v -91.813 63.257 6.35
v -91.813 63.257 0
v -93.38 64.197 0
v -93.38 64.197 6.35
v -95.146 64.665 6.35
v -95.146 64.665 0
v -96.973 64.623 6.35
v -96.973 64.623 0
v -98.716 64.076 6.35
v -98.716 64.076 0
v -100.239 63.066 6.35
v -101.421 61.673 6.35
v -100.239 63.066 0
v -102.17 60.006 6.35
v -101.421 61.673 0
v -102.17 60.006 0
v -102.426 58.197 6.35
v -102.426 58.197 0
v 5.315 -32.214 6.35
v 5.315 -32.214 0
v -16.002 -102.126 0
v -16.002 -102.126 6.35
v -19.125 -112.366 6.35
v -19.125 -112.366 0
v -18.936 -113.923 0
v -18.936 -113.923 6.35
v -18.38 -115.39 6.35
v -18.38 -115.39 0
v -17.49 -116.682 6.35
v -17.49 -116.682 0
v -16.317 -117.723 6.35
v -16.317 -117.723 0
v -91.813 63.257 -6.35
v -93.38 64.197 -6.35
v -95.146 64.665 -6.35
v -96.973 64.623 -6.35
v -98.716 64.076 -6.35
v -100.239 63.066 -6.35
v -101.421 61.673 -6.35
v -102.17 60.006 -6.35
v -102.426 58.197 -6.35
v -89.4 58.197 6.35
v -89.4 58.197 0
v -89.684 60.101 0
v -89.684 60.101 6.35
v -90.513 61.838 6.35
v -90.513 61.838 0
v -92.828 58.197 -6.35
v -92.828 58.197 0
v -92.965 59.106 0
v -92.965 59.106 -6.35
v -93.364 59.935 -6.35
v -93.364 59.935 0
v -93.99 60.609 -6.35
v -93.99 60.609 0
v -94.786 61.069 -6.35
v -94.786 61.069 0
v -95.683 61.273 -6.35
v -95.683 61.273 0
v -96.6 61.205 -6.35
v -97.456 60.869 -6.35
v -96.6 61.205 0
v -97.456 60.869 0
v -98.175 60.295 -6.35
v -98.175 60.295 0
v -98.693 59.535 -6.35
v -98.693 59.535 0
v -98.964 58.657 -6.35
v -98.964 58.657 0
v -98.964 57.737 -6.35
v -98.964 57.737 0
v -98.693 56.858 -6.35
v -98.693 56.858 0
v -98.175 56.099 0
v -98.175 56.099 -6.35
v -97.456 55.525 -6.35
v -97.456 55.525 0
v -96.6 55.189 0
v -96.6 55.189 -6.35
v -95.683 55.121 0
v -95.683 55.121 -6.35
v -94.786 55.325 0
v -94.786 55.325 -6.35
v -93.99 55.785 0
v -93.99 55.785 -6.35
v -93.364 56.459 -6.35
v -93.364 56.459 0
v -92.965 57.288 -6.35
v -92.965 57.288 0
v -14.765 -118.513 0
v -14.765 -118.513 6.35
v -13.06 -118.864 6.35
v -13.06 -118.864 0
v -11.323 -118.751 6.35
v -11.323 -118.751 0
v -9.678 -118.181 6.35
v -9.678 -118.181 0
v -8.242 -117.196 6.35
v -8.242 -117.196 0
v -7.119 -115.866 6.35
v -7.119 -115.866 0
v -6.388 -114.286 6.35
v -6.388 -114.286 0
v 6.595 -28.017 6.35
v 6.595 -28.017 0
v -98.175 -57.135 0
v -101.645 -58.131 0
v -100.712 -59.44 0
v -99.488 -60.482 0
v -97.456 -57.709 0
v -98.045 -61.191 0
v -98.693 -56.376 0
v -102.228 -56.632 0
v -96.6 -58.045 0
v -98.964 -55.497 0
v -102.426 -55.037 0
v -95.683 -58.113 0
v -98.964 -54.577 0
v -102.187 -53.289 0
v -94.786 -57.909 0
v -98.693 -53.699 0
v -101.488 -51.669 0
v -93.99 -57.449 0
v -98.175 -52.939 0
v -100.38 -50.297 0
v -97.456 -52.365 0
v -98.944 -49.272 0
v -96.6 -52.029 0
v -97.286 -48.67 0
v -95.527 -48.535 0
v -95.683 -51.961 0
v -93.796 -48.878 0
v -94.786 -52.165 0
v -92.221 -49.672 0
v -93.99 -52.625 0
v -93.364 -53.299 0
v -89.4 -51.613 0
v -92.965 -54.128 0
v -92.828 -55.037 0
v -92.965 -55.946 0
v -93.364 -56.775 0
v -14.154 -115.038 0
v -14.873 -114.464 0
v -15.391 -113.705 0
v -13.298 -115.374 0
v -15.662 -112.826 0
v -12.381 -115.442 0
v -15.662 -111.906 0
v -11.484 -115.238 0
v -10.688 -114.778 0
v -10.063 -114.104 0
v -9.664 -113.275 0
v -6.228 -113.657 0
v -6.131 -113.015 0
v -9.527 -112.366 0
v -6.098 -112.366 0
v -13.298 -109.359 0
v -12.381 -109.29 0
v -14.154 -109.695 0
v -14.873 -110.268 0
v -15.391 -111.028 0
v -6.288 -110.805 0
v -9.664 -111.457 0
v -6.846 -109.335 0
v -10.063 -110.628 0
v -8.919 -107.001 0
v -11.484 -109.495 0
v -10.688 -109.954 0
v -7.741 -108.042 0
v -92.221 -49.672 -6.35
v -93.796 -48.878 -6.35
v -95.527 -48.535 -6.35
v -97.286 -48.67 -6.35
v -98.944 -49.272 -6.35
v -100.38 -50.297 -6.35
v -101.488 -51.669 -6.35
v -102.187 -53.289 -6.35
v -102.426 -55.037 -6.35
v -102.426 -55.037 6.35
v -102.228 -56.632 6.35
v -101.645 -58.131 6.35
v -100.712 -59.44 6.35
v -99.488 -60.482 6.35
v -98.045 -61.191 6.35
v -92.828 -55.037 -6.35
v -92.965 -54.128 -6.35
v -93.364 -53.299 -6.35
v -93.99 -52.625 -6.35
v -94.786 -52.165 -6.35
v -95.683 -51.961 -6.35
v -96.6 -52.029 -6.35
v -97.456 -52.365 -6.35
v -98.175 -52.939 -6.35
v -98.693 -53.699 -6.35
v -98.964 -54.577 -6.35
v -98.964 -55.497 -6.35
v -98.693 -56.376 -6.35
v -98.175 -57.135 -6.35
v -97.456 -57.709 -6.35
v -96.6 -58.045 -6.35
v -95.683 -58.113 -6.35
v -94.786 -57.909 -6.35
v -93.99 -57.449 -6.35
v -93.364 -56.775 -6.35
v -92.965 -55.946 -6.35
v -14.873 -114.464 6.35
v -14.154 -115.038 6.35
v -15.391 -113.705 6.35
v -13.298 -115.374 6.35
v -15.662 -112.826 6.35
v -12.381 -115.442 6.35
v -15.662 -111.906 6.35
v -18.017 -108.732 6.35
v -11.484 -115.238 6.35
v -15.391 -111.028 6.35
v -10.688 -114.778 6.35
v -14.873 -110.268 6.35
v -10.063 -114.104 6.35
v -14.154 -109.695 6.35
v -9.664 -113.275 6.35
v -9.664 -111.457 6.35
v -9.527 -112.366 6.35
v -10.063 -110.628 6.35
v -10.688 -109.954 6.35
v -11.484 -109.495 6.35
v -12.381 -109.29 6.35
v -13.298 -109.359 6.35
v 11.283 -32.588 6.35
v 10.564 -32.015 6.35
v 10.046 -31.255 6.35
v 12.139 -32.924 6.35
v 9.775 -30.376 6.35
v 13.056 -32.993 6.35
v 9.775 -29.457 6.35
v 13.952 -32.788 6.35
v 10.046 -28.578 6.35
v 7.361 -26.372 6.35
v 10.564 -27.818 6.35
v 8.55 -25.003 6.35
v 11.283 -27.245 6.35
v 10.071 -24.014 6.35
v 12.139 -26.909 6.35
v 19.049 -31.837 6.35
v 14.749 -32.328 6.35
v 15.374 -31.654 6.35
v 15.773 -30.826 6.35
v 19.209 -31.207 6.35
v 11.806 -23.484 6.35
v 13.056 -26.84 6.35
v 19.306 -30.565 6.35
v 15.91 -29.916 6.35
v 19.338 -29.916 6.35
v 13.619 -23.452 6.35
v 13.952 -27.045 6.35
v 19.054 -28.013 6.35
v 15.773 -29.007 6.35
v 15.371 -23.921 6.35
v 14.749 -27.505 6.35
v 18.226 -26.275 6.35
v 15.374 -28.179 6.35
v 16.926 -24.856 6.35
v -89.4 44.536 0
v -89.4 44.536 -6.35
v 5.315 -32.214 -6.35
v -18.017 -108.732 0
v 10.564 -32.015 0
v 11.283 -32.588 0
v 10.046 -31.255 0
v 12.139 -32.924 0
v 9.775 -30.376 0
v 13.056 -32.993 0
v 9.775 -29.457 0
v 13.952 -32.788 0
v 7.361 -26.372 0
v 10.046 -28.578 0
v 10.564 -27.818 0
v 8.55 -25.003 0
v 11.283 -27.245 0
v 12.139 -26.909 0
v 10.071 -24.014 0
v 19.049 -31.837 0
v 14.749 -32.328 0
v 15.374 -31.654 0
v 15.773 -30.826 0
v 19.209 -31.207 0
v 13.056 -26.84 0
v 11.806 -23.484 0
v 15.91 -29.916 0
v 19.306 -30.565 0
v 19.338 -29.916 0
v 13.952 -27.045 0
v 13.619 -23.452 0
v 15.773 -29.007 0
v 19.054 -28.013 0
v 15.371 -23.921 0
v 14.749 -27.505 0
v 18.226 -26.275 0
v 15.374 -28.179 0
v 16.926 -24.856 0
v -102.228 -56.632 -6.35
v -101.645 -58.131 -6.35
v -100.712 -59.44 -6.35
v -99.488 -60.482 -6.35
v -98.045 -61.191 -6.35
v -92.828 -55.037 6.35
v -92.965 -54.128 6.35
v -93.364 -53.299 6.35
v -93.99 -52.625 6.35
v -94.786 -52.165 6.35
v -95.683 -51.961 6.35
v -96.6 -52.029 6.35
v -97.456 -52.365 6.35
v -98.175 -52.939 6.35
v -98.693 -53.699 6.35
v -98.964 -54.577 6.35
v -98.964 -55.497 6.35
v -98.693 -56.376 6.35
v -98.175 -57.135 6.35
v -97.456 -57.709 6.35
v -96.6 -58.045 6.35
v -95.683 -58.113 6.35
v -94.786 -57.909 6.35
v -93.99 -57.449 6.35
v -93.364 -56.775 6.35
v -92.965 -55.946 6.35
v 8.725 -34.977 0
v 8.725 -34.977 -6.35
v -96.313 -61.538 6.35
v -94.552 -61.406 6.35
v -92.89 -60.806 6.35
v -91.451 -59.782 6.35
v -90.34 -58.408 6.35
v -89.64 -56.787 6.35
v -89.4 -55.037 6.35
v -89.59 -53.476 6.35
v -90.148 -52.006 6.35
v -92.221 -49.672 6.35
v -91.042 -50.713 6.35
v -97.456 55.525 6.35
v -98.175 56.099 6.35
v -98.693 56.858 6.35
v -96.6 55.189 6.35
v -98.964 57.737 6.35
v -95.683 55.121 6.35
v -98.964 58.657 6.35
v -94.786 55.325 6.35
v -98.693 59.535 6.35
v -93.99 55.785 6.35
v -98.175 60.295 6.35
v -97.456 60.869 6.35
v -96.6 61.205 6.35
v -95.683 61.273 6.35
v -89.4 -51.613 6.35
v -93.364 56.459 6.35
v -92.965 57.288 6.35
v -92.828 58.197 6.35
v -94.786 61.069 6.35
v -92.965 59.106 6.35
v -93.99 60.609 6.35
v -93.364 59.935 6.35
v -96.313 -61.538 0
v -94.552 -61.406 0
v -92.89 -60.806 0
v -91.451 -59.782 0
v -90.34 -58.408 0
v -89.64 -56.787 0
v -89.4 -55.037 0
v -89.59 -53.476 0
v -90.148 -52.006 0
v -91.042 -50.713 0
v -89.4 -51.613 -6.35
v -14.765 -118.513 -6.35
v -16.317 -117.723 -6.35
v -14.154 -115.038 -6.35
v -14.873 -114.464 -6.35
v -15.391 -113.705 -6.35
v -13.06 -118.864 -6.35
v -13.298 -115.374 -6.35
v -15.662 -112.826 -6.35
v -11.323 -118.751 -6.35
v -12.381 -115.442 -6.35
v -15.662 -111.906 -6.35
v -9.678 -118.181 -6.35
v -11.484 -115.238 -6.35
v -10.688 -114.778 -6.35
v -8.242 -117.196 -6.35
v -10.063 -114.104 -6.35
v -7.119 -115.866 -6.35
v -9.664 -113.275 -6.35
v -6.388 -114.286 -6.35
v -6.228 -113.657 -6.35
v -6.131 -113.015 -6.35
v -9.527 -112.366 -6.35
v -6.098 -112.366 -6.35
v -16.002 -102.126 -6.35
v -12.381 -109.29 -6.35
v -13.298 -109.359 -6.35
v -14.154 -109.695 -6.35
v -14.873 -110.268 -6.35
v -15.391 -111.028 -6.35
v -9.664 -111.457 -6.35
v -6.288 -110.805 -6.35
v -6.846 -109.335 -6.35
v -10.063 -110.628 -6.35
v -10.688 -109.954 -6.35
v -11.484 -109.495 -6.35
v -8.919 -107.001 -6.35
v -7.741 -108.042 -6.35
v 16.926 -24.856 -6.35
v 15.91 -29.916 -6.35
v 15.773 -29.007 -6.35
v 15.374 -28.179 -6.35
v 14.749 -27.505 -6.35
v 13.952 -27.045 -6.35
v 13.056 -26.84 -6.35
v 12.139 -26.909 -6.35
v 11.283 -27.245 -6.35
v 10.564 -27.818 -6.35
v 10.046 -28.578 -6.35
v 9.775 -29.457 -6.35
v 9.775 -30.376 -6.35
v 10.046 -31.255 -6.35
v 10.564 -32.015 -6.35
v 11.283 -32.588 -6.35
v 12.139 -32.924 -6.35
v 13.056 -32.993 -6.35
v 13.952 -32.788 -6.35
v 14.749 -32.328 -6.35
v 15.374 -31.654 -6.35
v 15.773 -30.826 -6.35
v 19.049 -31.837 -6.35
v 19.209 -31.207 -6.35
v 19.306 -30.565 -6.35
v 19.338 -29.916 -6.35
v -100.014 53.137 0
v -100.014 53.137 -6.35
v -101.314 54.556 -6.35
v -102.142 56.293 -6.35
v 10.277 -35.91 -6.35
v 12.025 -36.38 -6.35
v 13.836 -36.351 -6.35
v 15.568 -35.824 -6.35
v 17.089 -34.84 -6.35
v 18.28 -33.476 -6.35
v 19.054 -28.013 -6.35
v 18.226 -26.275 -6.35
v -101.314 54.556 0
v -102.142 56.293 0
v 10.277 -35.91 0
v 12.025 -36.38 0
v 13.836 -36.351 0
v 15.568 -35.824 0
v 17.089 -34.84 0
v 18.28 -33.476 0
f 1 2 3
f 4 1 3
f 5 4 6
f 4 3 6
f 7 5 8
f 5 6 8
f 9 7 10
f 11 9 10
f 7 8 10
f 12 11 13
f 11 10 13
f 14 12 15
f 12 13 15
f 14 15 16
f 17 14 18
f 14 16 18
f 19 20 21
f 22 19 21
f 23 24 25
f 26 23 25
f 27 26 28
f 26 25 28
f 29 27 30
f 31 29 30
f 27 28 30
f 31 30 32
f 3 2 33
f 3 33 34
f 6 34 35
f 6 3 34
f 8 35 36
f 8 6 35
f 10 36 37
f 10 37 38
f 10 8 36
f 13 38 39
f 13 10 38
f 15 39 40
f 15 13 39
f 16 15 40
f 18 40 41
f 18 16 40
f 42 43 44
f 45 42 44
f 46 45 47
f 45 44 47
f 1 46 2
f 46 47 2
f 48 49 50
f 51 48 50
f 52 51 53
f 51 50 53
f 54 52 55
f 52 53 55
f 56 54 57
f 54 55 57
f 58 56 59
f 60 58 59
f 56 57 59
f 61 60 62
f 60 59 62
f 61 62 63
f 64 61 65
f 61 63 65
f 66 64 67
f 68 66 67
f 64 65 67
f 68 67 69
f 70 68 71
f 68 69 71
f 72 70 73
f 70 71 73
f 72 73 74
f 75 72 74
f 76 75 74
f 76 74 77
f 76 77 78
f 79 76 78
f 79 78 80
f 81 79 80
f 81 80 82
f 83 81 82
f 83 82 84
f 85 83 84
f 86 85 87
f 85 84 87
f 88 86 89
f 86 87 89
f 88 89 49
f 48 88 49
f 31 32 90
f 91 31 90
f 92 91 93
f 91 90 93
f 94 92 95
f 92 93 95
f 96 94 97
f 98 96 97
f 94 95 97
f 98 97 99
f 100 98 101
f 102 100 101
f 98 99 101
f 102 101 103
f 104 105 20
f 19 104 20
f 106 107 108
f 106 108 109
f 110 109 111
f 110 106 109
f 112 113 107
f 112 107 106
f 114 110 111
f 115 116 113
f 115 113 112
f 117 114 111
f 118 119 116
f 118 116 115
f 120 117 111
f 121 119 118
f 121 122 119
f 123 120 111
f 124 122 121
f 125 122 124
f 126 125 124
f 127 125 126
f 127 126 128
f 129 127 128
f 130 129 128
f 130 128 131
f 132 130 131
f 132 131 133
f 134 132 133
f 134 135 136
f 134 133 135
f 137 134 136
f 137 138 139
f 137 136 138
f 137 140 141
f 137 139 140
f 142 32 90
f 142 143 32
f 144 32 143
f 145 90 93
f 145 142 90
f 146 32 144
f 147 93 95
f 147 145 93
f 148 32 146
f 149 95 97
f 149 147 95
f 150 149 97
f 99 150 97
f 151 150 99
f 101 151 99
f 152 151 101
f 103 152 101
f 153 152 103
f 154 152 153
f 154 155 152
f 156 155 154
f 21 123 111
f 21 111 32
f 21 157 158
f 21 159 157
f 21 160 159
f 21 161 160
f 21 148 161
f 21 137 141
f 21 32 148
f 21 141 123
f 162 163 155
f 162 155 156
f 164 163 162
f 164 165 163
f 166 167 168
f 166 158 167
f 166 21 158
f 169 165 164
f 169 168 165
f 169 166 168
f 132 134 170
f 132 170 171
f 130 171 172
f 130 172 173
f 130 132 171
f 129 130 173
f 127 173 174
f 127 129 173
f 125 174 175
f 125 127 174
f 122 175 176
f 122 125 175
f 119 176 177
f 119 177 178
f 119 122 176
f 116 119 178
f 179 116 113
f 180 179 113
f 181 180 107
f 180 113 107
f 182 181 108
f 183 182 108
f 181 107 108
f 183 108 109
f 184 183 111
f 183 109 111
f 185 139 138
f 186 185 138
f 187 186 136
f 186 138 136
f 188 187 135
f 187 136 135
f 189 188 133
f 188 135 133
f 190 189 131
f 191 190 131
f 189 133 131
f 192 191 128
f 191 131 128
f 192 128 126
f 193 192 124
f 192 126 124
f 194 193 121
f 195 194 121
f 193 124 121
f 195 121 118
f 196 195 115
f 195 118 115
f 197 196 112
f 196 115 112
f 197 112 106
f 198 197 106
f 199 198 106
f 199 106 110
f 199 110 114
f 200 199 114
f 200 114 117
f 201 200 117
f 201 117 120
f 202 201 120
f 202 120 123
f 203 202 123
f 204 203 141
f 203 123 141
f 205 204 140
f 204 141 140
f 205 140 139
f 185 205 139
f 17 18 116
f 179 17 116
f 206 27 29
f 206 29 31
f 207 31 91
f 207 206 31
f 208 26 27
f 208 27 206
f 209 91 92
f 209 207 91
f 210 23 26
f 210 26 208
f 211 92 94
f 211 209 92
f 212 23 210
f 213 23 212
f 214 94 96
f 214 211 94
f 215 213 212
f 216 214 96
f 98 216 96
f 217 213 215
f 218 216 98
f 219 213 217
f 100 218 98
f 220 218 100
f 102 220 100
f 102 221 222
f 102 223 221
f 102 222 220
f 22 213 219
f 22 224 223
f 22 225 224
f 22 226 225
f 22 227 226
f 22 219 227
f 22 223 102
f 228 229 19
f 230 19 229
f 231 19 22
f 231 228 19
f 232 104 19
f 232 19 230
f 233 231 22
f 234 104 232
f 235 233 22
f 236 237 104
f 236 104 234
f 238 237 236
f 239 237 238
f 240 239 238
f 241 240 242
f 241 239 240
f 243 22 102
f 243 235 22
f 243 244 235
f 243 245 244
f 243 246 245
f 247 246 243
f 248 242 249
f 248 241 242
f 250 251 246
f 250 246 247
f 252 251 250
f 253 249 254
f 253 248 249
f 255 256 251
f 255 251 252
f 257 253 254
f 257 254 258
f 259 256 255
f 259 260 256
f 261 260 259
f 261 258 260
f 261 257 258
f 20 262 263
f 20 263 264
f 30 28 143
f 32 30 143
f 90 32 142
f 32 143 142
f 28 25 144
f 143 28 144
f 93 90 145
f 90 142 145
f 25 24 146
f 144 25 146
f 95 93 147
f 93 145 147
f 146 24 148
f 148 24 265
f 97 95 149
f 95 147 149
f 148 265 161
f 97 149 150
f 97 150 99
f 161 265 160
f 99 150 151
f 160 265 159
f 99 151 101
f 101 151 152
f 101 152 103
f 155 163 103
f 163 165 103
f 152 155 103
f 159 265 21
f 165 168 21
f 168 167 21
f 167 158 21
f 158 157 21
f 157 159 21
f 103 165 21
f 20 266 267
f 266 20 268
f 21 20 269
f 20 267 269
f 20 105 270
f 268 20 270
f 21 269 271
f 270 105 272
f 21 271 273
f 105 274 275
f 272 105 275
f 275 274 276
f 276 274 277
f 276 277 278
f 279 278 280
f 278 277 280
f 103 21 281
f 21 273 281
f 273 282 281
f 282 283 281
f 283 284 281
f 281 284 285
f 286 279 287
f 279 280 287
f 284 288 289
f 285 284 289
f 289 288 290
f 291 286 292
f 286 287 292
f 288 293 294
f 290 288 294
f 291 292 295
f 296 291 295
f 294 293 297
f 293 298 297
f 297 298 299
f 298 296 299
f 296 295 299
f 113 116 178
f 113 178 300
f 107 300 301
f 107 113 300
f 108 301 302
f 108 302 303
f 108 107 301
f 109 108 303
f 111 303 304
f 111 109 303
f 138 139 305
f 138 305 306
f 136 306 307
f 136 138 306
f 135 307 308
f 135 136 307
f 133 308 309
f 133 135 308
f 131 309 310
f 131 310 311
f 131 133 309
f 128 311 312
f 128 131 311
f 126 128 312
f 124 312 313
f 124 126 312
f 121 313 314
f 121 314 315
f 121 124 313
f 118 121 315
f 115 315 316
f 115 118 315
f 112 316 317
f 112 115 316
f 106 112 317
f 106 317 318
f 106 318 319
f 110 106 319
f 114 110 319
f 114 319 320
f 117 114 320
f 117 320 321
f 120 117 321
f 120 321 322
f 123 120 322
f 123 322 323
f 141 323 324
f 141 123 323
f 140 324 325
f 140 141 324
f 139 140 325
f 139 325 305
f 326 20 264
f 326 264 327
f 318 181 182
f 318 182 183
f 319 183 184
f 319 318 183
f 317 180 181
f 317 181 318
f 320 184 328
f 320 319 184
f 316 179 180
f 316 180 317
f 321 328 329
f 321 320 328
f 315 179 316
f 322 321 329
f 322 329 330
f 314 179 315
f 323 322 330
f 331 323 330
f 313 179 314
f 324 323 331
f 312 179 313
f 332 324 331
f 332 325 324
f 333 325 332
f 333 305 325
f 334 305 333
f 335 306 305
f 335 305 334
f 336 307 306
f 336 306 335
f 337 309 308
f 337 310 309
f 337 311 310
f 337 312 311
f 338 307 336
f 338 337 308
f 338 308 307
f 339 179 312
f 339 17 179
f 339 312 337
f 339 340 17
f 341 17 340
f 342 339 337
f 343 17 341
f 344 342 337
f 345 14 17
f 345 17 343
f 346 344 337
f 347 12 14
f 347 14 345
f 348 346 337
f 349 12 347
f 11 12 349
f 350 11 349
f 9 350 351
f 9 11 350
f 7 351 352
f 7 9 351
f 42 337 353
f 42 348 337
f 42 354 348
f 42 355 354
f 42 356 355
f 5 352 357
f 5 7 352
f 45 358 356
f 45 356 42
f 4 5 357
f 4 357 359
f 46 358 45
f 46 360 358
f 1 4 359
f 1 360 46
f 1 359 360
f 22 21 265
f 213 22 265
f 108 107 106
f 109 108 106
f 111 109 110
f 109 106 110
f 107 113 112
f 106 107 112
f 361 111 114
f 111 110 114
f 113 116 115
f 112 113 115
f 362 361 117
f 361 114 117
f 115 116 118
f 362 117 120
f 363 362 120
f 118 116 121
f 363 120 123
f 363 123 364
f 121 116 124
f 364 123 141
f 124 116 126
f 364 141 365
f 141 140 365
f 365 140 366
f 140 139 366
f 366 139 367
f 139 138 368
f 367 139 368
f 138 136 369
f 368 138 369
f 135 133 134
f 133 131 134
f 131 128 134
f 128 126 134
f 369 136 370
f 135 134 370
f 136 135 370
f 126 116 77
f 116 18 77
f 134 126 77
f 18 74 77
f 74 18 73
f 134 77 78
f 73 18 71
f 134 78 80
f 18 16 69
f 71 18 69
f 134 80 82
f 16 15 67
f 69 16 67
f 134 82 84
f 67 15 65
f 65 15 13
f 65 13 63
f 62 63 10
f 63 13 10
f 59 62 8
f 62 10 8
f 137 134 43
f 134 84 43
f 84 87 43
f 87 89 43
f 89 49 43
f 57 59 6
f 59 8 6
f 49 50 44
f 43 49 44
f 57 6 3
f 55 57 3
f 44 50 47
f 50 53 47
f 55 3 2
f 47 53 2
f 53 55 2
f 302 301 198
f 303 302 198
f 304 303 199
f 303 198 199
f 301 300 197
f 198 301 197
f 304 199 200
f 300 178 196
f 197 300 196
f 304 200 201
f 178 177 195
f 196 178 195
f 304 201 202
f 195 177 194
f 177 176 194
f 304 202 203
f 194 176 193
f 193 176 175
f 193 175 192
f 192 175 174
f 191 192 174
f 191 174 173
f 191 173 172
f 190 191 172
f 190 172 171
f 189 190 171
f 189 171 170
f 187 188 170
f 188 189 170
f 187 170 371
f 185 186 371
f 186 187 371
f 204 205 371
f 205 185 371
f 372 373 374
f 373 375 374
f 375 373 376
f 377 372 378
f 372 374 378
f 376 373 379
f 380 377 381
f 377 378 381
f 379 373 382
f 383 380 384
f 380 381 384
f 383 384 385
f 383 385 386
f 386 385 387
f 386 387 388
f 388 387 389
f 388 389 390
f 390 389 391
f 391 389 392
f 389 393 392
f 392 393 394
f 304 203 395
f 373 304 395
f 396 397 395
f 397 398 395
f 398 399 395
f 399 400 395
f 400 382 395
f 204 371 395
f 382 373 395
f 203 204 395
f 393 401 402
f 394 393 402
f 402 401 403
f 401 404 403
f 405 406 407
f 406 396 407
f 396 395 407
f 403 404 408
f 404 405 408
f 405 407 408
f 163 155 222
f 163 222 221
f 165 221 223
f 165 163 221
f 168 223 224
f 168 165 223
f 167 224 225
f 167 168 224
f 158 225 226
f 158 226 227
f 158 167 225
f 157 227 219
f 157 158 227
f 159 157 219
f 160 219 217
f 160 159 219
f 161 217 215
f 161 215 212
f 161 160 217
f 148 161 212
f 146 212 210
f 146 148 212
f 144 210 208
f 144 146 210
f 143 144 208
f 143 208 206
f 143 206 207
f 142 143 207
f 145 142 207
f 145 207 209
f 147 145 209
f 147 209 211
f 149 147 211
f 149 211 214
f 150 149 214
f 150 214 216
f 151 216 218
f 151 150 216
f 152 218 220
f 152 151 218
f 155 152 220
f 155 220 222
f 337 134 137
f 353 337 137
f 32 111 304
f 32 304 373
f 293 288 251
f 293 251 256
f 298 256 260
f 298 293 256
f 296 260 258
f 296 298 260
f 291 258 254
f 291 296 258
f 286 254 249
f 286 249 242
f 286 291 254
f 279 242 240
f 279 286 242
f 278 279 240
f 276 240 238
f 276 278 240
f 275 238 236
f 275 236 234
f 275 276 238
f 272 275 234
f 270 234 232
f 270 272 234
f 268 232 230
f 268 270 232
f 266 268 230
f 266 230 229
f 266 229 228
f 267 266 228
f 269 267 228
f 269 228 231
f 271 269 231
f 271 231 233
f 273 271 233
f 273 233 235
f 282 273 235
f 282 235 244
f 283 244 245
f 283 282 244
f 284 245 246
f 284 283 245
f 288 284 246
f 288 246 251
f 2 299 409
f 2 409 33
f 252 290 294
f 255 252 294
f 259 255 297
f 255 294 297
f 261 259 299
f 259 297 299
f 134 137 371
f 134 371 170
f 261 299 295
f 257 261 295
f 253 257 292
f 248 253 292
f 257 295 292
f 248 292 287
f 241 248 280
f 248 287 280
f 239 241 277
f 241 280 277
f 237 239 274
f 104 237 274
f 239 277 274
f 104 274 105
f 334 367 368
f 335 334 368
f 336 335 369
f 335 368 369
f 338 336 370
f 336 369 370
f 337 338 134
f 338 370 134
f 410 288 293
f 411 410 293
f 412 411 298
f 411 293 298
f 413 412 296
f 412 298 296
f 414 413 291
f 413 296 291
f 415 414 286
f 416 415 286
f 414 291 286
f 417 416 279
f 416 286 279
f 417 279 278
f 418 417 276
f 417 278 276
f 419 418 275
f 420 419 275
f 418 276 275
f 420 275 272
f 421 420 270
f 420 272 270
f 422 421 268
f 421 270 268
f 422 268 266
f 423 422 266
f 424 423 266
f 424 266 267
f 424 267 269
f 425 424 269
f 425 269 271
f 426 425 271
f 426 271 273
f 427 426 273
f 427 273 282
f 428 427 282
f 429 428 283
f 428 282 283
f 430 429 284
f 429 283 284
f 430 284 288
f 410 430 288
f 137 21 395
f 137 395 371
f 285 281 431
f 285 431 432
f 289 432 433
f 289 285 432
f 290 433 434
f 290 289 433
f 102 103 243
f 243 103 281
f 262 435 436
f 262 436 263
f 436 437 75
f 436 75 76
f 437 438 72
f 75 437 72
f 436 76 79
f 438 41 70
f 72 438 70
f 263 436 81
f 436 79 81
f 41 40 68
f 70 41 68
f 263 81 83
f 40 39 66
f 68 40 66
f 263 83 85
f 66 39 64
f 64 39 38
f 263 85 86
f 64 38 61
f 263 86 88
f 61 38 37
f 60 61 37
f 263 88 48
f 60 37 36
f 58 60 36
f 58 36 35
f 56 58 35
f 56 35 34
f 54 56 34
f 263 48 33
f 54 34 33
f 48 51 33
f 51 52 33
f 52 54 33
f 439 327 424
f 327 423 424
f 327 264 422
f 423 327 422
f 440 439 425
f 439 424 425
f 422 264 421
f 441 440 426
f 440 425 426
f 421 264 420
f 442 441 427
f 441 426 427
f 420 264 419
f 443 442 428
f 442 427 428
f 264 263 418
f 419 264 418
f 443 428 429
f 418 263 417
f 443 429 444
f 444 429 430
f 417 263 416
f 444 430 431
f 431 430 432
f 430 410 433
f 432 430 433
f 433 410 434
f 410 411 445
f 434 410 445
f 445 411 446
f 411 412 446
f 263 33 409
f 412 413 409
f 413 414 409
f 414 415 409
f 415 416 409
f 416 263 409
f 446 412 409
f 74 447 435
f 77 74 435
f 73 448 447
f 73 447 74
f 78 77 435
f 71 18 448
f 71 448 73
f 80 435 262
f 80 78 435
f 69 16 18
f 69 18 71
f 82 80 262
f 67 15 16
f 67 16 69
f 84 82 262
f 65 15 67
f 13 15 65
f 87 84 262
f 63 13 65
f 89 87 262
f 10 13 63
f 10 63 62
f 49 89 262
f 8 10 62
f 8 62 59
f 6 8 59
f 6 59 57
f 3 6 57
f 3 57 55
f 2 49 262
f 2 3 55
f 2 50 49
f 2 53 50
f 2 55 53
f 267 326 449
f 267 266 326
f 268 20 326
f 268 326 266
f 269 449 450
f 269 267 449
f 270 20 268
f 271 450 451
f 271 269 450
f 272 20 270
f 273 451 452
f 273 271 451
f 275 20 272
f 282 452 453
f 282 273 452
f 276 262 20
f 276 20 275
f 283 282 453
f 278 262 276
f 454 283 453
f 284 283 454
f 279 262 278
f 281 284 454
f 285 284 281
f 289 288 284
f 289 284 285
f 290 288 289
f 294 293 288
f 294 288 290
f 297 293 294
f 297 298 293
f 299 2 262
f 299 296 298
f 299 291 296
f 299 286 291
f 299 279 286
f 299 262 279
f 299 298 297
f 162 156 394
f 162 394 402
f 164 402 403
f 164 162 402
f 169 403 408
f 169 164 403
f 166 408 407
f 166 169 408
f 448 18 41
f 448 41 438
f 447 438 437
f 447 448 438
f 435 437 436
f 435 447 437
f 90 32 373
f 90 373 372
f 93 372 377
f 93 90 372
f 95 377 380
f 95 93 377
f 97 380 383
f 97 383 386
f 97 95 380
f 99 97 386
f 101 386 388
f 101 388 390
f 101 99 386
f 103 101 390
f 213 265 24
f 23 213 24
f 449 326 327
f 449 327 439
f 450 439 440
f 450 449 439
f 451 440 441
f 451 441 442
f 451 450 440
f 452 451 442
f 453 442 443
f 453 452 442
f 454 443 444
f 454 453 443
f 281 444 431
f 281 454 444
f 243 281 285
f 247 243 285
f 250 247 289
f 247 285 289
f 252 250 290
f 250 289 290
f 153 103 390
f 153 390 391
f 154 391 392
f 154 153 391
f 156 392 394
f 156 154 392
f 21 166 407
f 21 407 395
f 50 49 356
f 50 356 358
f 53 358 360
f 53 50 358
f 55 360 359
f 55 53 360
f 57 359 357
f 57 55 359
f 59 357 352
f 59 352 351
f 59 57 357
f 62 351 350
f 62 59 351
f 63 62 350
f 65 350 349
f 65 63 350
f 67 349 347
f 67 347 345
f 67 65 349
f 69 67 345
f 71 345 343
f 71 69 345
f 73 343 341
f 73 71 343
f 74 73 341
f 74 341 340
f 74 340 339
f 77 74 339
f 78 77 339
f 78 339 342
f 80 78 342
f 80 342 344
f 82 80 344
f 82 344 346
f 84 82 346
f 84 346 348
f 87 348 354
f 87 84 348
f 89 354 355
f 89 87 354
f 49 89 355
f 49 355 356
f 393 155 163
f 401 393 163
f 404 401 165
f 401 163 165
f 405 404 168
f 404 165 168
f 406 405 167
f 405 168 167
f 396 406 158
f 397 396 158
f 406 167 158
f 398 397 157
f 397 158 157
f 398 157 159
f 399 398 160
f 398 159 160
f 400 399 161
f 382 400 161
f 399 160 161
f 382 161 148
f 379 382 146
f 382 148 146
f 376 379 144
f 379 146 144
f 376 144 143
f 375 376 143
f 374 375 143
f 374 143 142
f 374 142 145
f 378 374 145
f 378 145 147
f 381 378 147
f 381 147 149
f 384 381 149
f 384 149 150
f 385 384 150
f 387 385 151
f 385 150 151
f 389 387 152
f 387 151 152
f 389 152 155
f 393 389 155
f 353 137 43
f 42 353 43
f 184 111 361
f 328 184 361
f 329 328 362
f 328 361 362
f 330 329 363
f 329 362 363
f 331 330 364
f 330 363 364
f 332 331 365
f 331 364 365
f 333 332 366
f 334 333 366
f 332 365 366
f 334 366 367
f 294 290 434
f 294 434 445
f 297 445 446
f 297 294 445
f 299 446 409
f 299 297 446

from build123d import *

# Parameters (mm, degrees)
F0_R     = 3.0849178634
F1_DEPTH = 6.35
F2_DEPTH = 6.35


with BuildPart() as f1:
    # F0 (on Top) → F1 (new body)
    with BuildSketch(Plane.XY):
        with BuildLine():
            ThreePointArc((-16.316703141, -117.7228137789), (-10.4812295121, -118.5211458672), (-6.387803424, -114.286296465))
            ThreePointArc((-6.387803424, -114.286296465), (-6.171117008, -113.3370927796), (-6.0983461646, -112.3661936893))
            ThreePointArc((-6.0983461646, -112.3661936893), (-6.8464855812, -109.3353793535), (-8.919033335, -107.0008357294))
            ThreePointArc((-8.919033335, -107.0008357294), (-13.8291124641, -105.9678228216), (-18.0165959077, -108.7320542033))
            Line((-18.0165959077, -108.7320542033), (-19.1247258839, -112.3661936893))
            ThreePointArc((-19.1247258839, -112.3661936893), (-18.3801623356, -115.3901964385), (-16.316703141, -117.7228137789))
        make_face()
        with Locations((-12.6115360242, -112.3661936893)):
            Circle(F0_R, mode=Mode.SUBTRACT)
        with BuildLine():
            Line((-8.919033335, -107.0008357294), (-16.0022815285, -102.1260607007))
            Line((-16.0022815285, -102.1260607007), (-18.0165959077, -108.7320542033))
            ThreePointArc((-18.0165959077, -108.7320542033), (-13.8291124641, -105.9678228216), (-8.919033335, -107.0008357294))
        make_face()
        with BuildLine():
            Line((-6.387803424, -114.286296465), (19.0490183589, -31.8365552445))
            ThreePointArc((19.0490183589, -31.8365552445), (14.7206225754, -36.1477717913), (8.7247524678, -34.9768149931))
            Line((8.7247524678, -34.9768149931), (5.3154160158, -32.2141477822))
            Line((5.3154160158, -32.2141477822), (-16.0022815285, -102.1260607007))
            Line((-16.0022815285, -102.1260607007), (-8.919033335, -107.0008357294))
            ThreePointArc((-8.919033335, -107.0008357294), (-6.8464855812, -109.3353793535), (-6.0983461646, -112.3661936893))
            ThreePointArc((-6.0983461646, -112.3661936893), (-6.171117008, -113.3370927796), (-6.387803424, -114.286296465))
        make_face()
        with BuildLine():
            ThreePointArc((19.0490183589, -31.8365552445), (19.2657047749, -30.8873515591), (19.3384756184, -29.9164524688))
            ThreePointArc((19.3384756184, -29.9164524688), (18.7044521111, -27.1134103447), (16.9258190496, -24.8560899444))
            ThreePointArc((16.9258190496, -24.8560899444), (10.919725754, -23.6882518284), (6.5952848208, -28.0167865871))
            ThreePointArc((6.5952848208, -28.0167865871), (6.5970851184, -31.8220124735), (8.7247524678, -34.9768149931))
            ThreePointArc((8.7247524678, -34.9768149931), (14.7206225754, -36.1477717913), (19.0490183589, -31.8365552445))
        make_face()
        with Locations((12.8252857587, -29.9164524688)):
            Circle(F0_R, mode=Mode.SUBTRACT)
        with BuildLine():
            ThreePointArc((8.7247524678, -34.9768149931), (6.5970851184, -31.8220124735), (6.5952848208, -28.0167865871))
            Line((6.5952848208, -28.0167865871), (5.3154160158, -32.2141477822))
            Line((5.3154160158, -32.2141477822), (8.7247524678, -34.9768149931))
        make_face()
    extrude(amount=F1_DEPTH)


with BuildPart() as f1b:
    # F0 (on Top) → F1, piece 2 (new body)
    with BuildSketch(Plane.XY):
        with BuildLine():
            ThreePointArc((-92.2206801264, -49.6716589821), (-98.9439971514, -49.2719664991), (-102.4263726753, -55.037016942))
            ThreePointArc((-102.4263726753, -55.037016942), (-101.2191601363, -58.814350237), (-98.0450335378, -61.1914344325))
            ThreePointArc((-98.0450335378, -61.1914344325), (-92.1358495207, -60.3429942627), (-89.399992956, -55.037016942))
            ThreePointArc((-89.399992956, -55.037016942), (-90.1481323727, -52.0062026063), (-92.2206801264, -49.6716589821))
        make_face()
        with Locations((-95.9131828157, -55.037016942)):
            Circle(F0_R, mode=Mode.SUBTRACT)
        with BuildLine():
            ThreePointArc((-100.0137161066, 53.1365777234), (-101.792349168, 55.3938981238), (-102.4263726753, 58.1969402478))
            Line((-102.4263726753, 58.1969402478), (-102.4263726753, -55.037016942))
            ThreePointArc((-102.4263726753, -55.037016942), (-98.9439971514, -49.2719664991), (-92.2206801264, -49.6716589821))
            Line((-92.2206801264, -49.6716589821), (-89.399992956, -51.6128891927))
            Line((-89.399992956, -51.6128891927), (-89.399992956, 44.536022939))
            Line((-89.399992956, 44.536022939), (-100.0137161066, 53.1365777234))
        make_face()
        with BuildLine():
            ThreePointArc((-89.399992956, 58.1969402478), (-90.0340164633, 60.9999823718), (-91.8126495247, 63.2573027721))
            ThreePointArc((-91.8126495247, 63.2573027721), (-98.7162249397, 64.0761066001), (-102.4263726753, 58.1969402478))
            ThreePointArc((-102.4263726753, 58.1969402478), (-101.792349168, 55.3938981238), (-100.0137161066, 53.1365777234))
            ThreePointArc((-100.0137161066, 53.1365777234), (-93.1101406917, 52.3177738954), (-89.399992956, 58.1969402478))
        make_face()
        with Locations((-95.9131828157, 58.1969402478)):
            Circle(F0_R, mode=Mode.SUBTRACT)
        with BuildLine():
            Line((-89.399992956, 44.536022939), (-89.399992956, 58.1969402478))
            ThreePointArc((-89.399992956, 58.1969402478), (-93.1101406917, 52.3177738954), (-100.0137161066, 53.1365777234))
            Line((-100.0137161066, 53.1365777234), (-89.399992956, 44.536022939))
        make_face()
    extrude(amount=F1_DEPTH)


with BuildPart() as f2:
    # F0 (on Top) → F2 (new body)
    with BuildSketch(Plane.XY):
        with BuildLine():
            ThreePointArc((-16.316703141, -117.7228137789), (-10.4812295121, -118.5211458672), (-6.387803424, -114.286296465))
            ThreePointArc((-6.387803424, -114.286296465), (-6.171117008, -113.3370927796), (-6.0983461646, -112.3661936893))
            ThreePointArc((-6.0983461646, -112.3661936893), (-6.8464855812, -109.3353793535), (-8.919033335, -107.0008357294))
            ThreePointArc((-8.919033335, -107.0008357294), (-13.8291124641, -105.9678228216), (-18.0165959077, -108.7320542033))
            Line((-18.0165959077, -108.7320542033), (-19.1247258839, -112.3661936893))
            ThreePointArc((-19.1247258839, -112.3661936893), (-18.3801623356, -115.3901964385), (-16.316703141, -117.7228137789))
        make_face()
        with Locations((-12.6115360242, -112.3661936893)):
            Circle(F0_R, mode=Mode.SUBTRACT)
        with BuildLine():
            Line((-98.0450335378, -61.1914344325), (-16.316703141, -117.7228137789))
            ThreePointArc((-16.316703141, -117.7228137789), (-18.3801623356, -115.3901964385), (-19.1247258839, -112.3661936893))
            ThreePointArc((-19.1247258839, -112.3661936893), (-18.8415369621, -110.4665278076), (-18.0165959077, -108.7320542033))
            Line((-18.0165959077, -108.7320542033), (-16.0022815285, -102.1260607007))
            Line((-16.0022815285, -102.1260607007), (-89.399992956, -51.6128891927))
            Line((-89.399992956, -51.6128891927), (-89.399992956, -55.037016942))
            ThreePointArc((-89.399992956, -55.037016942), (-92.1358495207, -60.3429942627), (-98.0450335378, -61.1914344325))
        make_face()
        with BuildLine():
            Line((-8.919033335, -107.0008357294), (-16.0022815285, -102.1260607007))
            Line((-16.0022815285, -102.1260607007), (-18.0165959077, -108.7320542033))
            ThreePointArc((-18.0165959077, -108.7320542033), (-13.8291124641, -105.9678228216), (-8.919033335, -107.0008357294))
        make_face()
        with BuildLine():
            ThreePointArc((-18.0165959077, -108.7320542033), (-18.8415369621, -110.4665278076), (-19.1247258839, -112.3661936893))
            Line((-19.1247258839, -112.3661936893), (-18.0165959077, -108.7320542033))
        make_face()
        with BuildLine():
            ThreePointArc((-92.2206801264, -49.6716589821), (-98.9439971514, -49.2719664991), (-102.4263726753, -55.037016942))
            ThreePointArc((-102.4263726753, -55.037016942), (-101.2191601363, -58.814350237), (-98.0450335378, -61.1914344325))
            ThreePointArc((-98.0450335378, -61.1914344325), (-92.1358495207, -60.3429942627), (-89.399992956, -55.037016942))
            ThreePointArc((-89.399992956, -55.037016942), (-90.1481323727, -52.0062026063), (-92.2206801264, -49.6716589821))
        make_face()
        with Locations((-95.9131828157, -55.037016942)):
            Circle(F0_R, mode=Mode.SUBTRACT)
        with BuildLine():
            Line((-89.399992956, -55.037016942), (-89.399992956, -51.6128891927))
            Line((-89.399992956, -51.6128891927), (-92.2206801264, -49.6716589821))
            ThreePointArc((-92.2206801264, -49.6716589821), (-90.1481323727, -52.0062026063), (-89.399992956, -55.037016942))
        make_face()
    extrude(amount=-F2_DEPTH)


with BuildPart() as f2b:
    # F0 (on Top) → F2, piece 2 (new body)
    with BuildSketch(Plane.XY):
        with BuildLine():
            ThreePointArc((6.5952848208, -28.0167865871), (10.919725754, -23.6882518284), (16.9258190496, -24.8560899444))
            Line((16.9258190496, -24.8560899444), (-91.8126495247, 63.2573027721))
            ThreePointArc((-91.8126495247, 63.2573027721), (-90.0340164633, 60.9999823718), (-89.399992956, 58.1969402478))
            Line((-89.399992956, 58.1969402478), (-89.399992956, 44.536022939))
            Line((-89.399992956, 44.536022939), (5.3154160158, -32.2141477822))
            Line((5.3154160158, -32.2141477822), (6.5952848208, -28.0167865871))
        make_face()
        with BuildLine():
            ThreePointArc((19.0490183589, -31.8365552445), (19.2657047749, -30.8873515591), (19.3384756184, -29.9164524688))
            ThreePointArc((19.3384756184, -29.9164524688), (18.7044521111, -27.1134103447), (16.9258190496, -24.8560899444))
            ThreePointArc((16.9258190496, -24.8560899444), (10.919725754, -23.6882518284), (6.5952848208, -28.0167865871))
            ThreePointArc((6.5952848208, -28.0167865871), (6.5970851184, -31.8220124735), (8.7247524678, -34.9768149931))
            ThreePointArc((8.7247524678, -34.9768149931), (14.7206225754, -36.1477717913), (19.0490183589, -31.8365552445))
        make_face()
        with Locations((12.8252857587, -29.9164524688)):
            Circle(F0_R, mode=Mode.SUBTRACT)
        with BuildLine():
            ThreePointArc((8.7247524678, -34.9768149931), (6.5970851184, -31.8220124735), (6.5952848208, -28.0167865871))
            Line((6.5952848208, -28.0167865871), (5.3154160158, -32.2141477822))
            Line((5.3154160158, -32.2141477822), (8.7247524678, -34.9768149931))
        make_face()
        with BuildLine():
            Line((-89.399992956, 44.536022939), (-89.399992956, 58.1969402478))
            ThreePointArc((-89.399992956, 58.1969402478), (-93.1101406917, 52.3177738954), (-100.0137161066, 53.1365777234))
            Line((-100.0137161066, 53.1365777234), (-89.399992956, 44.536022939))
        make_face()
        with BuildLine():
            ThreePointArc((-89.399992956, 58.1969402478), (-90.0340164633, 60.9999823718), (-91.8126495247, 63.2573027721))
            ThreePointArc((-91.8126495247, 63.2573027721), (-98.7162249397, 64.0761066001), (-102.4263726753, 58.1969402478))
            ThreePointArc((-102.4263726753, 58.1969402478), (-101.792349168, 55.3938981238), (-100.0137161066, 53.1365777234))
            ThreePointArc((-100.0137161066, 53.1365777234), (-93.1101406917, 52.3177738954), (-89.399992956, 58.1969402478))
        make_face()
        with Locations((-95.9131828157, 58.1969402478)):
            Circle(F0_R, mode=Mode.SUBTRACT)
    extrude(amount=-F2_DEPTH)


solid = Compound([f1.part, f1b.part, f2.part, f2b.part])
